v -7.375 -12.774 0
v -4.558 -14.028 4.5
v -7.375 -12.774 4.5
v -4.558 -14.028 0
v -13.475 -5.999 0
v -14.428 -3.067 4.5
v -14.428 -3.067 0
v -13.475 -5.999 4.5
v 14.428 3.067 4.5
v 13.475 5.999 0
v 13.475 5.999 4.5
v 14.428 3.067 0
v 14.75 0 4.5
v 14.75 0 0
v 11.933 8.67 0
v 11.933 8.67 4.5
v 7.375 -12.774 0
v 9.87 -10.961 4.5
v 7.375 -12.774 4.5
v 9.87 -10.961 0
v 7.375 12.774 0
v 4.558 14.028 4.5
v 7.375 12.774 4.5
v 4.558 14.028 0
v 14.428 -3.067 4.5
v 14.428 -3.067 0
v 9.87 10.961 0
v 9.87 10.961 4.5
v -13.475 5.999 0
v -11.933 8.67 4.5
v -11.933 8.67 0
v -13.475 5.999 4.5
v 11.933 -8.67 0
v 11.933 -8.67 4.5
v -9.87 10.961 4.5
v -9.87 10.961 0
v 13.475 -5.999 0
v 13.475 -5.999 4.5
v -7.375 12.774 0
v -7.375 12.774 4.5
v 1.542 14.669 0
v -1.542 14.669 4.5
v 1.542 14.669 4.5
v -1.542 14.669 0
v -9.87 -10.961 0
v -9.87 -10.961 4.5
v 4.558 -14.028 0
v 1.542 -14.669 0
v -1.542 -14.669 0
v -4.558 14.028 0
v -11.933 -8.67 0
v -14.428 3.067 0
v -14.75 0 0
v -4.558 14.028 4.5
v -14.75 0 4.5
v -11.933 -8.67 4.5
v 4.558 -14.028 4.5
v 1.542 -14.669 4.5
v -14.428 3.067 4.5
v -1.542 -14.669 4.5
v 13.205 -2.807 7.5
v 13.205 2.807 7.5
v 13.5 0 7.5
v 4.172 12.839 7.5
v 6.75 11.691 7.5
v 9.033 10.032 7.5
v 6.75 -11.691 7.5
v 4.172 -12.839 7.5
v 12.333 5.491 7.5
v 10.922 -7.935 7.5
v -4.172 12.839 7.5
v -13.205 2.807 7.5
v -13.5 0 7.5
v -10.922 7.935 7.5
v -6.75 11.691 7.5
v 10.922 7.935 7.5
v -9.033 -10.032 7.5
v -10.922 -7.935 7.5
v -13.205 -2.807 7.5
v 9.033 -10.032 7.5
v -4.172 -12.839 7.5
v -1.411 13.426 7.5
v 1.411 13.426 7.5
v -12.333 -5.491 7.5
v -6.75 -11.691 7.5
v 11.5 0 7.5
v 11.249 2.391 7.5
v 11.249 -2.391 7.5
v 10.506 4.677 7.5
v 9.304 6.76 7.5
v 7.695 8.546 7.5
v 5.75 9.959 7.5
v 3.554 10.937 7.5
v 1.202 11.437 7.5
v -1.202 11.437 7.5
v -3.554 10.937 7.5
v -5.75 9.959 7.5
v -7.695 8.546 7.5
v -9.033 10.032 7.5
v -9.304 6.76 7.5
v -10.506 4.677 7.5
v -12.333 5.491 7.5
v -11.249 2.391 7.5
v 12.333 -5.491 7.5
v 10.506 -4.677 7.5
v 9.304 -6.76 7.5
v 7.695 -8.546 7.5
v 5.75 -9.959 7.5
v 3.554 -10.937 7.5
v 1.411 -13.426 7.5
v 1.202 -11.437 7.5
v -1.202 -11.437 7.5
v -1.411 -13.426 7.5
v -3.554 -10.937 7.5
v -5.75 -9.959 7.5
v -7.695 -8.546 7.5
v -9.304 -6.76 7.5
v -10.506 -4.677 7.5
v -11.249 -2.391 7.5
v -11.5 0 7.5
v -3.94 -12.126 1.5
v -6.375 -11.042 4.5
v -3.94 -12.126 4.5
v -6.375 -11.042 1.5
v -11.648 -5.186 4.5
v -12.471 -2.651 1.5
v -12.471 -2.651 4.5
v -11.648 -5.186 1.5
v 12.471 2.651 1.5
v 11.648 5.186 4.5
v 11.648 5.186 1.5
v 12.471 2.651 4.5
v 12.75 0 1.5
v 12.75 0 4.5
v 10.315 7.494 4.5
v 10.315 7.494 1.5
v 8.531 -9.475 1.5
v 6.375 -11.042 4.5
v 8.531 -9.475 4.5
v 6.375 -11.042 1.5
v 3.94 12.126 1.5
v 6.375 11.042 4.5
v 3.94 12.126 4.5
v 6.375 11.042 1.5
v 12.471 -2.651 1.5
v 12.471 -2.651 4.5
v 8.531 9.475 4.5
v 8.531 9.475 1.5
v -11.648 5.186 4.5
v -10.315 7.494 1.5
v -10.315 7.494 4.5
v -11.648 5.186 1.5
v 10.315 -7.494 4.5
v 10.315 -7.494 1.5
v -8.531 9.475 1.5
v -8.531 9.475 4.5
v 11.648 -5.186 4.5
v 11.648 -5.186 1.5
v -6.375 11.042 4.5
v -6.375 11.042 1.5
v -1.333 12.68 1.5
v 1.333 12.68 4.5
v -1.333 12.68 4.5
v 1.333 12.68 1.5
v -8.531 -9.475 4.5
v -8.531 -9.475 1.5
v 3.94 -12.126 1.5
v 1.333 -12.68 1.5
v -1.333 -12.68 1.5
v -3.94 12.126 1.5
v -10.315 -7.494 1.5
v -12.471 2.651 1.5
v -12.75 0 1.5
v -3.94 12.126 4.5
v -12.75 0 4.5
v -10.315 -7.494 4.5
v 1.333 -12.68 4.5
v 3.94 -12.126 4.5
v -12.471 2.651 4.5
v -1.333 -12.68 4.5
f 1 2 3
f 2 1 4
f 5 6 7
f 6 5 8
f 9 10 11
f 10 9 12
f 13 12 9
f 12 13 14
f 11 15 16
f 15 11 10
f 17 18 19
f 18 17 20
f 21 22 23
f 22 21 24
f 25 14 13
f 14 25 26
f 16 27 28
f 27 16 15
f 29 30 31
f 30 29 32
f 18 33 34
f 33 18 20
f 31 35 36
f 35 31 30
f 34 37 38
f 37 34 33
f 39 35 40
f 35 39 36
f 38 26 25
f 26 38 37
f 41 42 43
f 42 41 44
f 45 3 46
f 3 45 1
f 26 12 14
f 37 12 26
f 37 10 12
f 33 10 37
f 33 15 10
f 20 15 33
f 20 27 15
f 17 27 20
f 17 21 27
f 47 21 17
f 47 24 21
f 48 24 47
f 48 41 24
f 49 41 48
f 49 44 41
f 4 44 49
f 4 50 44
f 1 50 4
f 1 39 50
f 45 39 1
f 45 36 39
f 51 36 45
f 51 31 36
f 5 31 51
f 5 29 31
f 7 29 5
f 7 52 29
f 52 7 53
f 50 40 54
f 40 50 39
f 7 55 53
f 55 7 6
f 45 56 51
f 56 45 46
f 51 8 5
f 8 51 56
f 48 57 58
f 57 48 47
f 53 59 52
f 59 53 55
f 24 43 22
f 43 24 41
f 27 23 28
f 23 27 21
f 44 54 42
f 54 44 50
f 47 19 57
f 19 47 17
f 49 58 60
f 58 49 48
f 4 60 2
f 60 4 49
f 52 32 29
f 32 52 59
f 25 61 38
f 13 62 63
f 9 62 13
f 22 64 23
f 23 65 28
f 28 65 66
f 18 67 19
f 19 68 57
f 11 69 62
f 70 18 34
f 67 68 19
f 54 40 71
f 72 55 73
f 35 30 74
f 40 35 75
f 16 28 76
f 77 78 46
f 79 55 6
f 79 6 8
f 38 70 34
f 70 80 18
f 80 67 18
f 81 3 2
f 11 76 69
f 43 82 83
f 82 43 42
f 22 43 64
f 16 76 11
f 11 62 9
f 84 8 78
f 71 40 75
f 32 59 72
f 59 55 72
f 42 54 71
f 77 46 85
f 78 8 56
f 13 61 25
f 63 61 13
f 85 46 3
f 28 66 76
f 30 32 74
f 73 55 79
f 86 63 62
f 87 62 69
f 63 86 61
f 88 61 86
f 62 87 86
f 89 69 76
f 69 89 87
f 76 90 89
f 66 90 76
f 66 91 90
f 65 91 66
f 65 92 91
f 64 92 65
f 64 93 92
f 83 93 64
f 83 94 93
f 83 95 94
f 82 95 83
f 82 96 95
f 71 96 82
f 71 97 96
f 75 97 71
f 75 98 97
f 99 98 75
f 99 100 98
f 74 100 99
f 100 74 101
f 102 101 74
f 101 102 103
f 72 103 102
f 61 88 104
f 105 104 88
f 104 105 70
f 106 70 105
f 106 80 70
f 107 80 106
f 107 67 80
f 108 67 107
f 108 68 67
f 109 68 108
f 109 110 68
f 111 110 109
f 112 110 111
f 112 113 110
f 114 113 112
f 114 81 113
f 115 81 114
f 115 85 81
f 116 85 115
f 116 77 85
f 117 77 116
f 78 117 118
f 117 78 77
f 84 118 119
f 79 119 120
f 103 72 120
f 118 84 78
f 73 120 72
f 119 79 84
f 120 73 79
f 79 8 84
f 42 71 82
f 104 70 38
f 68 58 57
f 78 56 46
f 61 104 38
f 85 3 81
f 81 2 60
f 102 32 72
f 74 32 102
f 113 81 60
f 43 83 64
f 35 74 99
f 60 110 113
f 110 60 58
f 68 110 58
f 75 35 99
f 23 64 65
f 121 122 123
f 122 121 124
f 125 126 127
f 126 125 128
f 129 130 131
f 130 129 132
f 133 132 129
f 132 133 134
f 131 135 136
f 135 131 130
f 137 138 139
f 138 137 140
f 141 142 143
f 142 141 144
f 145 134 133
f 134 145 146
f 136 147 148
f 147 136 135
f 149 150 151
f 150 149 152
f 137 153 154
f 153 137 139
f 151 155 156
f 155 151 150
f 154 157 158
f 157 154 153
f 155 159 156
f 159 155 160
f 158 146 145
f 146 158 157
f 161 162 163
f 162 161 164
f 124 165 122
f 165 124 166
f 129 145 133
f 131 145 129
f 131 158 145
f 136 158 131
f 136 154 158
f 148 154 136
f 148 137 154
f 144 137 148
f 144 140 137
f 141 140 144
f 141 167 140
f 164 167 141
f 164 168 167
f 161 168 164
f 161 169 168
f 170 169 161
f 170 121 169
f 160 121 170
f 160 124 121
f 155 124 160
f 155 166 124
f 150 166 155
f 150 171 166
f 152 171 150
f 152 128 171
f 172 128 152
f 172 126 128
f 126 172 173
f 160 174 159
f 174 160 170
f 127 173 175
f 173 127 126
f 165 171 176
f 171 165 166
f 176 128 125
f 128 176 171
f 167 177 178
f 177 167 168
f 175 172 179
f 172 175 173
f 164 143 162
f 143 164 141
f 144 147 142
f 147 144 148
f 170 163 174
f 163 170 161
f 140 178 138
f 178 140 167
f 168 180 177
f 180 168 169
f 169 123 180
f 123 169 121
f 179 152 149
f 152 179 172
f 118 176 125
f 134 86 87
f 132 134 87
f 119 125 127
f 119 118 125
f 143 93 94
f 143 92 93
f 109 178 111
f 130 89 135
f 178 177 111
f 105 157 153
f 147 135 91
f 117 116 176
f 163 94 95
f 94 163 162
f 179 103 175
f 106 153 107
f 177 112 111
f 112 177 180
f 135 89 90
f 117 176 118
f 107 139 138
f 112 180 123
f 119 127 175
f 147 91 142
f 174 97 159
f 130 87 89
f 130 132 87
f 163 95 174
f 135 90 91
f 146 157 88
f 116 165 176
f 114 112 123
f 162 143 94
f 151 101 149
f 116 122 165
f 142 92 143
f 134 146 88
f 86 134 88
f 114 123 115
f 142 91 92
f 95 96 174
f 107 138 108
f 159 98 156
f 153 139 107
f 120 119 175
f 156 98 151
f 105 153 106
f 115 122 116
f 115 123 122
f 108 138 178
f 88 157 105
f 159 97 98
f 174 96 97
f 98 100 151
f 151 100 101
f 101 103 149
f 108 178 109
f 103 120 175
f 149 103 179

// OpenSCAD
base = 1.5;
wall = 2;

inner_z1 = 3;
inner_z2 = 3;

inner_r1 = 12.75;
inner_r2 = 11.5;

difference()
{
	union()
	{
		cylinder(r = inner_r1 + wall, h = base + inner_z1);

		translate([0, 0, base + inner_z1])
		cylinder(r1 = inner_r1 + wall, r2 = inner_r2 + wall, h = inner_z1);
	}

	translate([0, 0, base])
	cylinder(r = inner_r1, h = inner_z1);

	translate([0, 0, base + inner_z1])
	cylinder(r1 = inner_r1, r2 = inner_r2, h = inner_z1);

}
